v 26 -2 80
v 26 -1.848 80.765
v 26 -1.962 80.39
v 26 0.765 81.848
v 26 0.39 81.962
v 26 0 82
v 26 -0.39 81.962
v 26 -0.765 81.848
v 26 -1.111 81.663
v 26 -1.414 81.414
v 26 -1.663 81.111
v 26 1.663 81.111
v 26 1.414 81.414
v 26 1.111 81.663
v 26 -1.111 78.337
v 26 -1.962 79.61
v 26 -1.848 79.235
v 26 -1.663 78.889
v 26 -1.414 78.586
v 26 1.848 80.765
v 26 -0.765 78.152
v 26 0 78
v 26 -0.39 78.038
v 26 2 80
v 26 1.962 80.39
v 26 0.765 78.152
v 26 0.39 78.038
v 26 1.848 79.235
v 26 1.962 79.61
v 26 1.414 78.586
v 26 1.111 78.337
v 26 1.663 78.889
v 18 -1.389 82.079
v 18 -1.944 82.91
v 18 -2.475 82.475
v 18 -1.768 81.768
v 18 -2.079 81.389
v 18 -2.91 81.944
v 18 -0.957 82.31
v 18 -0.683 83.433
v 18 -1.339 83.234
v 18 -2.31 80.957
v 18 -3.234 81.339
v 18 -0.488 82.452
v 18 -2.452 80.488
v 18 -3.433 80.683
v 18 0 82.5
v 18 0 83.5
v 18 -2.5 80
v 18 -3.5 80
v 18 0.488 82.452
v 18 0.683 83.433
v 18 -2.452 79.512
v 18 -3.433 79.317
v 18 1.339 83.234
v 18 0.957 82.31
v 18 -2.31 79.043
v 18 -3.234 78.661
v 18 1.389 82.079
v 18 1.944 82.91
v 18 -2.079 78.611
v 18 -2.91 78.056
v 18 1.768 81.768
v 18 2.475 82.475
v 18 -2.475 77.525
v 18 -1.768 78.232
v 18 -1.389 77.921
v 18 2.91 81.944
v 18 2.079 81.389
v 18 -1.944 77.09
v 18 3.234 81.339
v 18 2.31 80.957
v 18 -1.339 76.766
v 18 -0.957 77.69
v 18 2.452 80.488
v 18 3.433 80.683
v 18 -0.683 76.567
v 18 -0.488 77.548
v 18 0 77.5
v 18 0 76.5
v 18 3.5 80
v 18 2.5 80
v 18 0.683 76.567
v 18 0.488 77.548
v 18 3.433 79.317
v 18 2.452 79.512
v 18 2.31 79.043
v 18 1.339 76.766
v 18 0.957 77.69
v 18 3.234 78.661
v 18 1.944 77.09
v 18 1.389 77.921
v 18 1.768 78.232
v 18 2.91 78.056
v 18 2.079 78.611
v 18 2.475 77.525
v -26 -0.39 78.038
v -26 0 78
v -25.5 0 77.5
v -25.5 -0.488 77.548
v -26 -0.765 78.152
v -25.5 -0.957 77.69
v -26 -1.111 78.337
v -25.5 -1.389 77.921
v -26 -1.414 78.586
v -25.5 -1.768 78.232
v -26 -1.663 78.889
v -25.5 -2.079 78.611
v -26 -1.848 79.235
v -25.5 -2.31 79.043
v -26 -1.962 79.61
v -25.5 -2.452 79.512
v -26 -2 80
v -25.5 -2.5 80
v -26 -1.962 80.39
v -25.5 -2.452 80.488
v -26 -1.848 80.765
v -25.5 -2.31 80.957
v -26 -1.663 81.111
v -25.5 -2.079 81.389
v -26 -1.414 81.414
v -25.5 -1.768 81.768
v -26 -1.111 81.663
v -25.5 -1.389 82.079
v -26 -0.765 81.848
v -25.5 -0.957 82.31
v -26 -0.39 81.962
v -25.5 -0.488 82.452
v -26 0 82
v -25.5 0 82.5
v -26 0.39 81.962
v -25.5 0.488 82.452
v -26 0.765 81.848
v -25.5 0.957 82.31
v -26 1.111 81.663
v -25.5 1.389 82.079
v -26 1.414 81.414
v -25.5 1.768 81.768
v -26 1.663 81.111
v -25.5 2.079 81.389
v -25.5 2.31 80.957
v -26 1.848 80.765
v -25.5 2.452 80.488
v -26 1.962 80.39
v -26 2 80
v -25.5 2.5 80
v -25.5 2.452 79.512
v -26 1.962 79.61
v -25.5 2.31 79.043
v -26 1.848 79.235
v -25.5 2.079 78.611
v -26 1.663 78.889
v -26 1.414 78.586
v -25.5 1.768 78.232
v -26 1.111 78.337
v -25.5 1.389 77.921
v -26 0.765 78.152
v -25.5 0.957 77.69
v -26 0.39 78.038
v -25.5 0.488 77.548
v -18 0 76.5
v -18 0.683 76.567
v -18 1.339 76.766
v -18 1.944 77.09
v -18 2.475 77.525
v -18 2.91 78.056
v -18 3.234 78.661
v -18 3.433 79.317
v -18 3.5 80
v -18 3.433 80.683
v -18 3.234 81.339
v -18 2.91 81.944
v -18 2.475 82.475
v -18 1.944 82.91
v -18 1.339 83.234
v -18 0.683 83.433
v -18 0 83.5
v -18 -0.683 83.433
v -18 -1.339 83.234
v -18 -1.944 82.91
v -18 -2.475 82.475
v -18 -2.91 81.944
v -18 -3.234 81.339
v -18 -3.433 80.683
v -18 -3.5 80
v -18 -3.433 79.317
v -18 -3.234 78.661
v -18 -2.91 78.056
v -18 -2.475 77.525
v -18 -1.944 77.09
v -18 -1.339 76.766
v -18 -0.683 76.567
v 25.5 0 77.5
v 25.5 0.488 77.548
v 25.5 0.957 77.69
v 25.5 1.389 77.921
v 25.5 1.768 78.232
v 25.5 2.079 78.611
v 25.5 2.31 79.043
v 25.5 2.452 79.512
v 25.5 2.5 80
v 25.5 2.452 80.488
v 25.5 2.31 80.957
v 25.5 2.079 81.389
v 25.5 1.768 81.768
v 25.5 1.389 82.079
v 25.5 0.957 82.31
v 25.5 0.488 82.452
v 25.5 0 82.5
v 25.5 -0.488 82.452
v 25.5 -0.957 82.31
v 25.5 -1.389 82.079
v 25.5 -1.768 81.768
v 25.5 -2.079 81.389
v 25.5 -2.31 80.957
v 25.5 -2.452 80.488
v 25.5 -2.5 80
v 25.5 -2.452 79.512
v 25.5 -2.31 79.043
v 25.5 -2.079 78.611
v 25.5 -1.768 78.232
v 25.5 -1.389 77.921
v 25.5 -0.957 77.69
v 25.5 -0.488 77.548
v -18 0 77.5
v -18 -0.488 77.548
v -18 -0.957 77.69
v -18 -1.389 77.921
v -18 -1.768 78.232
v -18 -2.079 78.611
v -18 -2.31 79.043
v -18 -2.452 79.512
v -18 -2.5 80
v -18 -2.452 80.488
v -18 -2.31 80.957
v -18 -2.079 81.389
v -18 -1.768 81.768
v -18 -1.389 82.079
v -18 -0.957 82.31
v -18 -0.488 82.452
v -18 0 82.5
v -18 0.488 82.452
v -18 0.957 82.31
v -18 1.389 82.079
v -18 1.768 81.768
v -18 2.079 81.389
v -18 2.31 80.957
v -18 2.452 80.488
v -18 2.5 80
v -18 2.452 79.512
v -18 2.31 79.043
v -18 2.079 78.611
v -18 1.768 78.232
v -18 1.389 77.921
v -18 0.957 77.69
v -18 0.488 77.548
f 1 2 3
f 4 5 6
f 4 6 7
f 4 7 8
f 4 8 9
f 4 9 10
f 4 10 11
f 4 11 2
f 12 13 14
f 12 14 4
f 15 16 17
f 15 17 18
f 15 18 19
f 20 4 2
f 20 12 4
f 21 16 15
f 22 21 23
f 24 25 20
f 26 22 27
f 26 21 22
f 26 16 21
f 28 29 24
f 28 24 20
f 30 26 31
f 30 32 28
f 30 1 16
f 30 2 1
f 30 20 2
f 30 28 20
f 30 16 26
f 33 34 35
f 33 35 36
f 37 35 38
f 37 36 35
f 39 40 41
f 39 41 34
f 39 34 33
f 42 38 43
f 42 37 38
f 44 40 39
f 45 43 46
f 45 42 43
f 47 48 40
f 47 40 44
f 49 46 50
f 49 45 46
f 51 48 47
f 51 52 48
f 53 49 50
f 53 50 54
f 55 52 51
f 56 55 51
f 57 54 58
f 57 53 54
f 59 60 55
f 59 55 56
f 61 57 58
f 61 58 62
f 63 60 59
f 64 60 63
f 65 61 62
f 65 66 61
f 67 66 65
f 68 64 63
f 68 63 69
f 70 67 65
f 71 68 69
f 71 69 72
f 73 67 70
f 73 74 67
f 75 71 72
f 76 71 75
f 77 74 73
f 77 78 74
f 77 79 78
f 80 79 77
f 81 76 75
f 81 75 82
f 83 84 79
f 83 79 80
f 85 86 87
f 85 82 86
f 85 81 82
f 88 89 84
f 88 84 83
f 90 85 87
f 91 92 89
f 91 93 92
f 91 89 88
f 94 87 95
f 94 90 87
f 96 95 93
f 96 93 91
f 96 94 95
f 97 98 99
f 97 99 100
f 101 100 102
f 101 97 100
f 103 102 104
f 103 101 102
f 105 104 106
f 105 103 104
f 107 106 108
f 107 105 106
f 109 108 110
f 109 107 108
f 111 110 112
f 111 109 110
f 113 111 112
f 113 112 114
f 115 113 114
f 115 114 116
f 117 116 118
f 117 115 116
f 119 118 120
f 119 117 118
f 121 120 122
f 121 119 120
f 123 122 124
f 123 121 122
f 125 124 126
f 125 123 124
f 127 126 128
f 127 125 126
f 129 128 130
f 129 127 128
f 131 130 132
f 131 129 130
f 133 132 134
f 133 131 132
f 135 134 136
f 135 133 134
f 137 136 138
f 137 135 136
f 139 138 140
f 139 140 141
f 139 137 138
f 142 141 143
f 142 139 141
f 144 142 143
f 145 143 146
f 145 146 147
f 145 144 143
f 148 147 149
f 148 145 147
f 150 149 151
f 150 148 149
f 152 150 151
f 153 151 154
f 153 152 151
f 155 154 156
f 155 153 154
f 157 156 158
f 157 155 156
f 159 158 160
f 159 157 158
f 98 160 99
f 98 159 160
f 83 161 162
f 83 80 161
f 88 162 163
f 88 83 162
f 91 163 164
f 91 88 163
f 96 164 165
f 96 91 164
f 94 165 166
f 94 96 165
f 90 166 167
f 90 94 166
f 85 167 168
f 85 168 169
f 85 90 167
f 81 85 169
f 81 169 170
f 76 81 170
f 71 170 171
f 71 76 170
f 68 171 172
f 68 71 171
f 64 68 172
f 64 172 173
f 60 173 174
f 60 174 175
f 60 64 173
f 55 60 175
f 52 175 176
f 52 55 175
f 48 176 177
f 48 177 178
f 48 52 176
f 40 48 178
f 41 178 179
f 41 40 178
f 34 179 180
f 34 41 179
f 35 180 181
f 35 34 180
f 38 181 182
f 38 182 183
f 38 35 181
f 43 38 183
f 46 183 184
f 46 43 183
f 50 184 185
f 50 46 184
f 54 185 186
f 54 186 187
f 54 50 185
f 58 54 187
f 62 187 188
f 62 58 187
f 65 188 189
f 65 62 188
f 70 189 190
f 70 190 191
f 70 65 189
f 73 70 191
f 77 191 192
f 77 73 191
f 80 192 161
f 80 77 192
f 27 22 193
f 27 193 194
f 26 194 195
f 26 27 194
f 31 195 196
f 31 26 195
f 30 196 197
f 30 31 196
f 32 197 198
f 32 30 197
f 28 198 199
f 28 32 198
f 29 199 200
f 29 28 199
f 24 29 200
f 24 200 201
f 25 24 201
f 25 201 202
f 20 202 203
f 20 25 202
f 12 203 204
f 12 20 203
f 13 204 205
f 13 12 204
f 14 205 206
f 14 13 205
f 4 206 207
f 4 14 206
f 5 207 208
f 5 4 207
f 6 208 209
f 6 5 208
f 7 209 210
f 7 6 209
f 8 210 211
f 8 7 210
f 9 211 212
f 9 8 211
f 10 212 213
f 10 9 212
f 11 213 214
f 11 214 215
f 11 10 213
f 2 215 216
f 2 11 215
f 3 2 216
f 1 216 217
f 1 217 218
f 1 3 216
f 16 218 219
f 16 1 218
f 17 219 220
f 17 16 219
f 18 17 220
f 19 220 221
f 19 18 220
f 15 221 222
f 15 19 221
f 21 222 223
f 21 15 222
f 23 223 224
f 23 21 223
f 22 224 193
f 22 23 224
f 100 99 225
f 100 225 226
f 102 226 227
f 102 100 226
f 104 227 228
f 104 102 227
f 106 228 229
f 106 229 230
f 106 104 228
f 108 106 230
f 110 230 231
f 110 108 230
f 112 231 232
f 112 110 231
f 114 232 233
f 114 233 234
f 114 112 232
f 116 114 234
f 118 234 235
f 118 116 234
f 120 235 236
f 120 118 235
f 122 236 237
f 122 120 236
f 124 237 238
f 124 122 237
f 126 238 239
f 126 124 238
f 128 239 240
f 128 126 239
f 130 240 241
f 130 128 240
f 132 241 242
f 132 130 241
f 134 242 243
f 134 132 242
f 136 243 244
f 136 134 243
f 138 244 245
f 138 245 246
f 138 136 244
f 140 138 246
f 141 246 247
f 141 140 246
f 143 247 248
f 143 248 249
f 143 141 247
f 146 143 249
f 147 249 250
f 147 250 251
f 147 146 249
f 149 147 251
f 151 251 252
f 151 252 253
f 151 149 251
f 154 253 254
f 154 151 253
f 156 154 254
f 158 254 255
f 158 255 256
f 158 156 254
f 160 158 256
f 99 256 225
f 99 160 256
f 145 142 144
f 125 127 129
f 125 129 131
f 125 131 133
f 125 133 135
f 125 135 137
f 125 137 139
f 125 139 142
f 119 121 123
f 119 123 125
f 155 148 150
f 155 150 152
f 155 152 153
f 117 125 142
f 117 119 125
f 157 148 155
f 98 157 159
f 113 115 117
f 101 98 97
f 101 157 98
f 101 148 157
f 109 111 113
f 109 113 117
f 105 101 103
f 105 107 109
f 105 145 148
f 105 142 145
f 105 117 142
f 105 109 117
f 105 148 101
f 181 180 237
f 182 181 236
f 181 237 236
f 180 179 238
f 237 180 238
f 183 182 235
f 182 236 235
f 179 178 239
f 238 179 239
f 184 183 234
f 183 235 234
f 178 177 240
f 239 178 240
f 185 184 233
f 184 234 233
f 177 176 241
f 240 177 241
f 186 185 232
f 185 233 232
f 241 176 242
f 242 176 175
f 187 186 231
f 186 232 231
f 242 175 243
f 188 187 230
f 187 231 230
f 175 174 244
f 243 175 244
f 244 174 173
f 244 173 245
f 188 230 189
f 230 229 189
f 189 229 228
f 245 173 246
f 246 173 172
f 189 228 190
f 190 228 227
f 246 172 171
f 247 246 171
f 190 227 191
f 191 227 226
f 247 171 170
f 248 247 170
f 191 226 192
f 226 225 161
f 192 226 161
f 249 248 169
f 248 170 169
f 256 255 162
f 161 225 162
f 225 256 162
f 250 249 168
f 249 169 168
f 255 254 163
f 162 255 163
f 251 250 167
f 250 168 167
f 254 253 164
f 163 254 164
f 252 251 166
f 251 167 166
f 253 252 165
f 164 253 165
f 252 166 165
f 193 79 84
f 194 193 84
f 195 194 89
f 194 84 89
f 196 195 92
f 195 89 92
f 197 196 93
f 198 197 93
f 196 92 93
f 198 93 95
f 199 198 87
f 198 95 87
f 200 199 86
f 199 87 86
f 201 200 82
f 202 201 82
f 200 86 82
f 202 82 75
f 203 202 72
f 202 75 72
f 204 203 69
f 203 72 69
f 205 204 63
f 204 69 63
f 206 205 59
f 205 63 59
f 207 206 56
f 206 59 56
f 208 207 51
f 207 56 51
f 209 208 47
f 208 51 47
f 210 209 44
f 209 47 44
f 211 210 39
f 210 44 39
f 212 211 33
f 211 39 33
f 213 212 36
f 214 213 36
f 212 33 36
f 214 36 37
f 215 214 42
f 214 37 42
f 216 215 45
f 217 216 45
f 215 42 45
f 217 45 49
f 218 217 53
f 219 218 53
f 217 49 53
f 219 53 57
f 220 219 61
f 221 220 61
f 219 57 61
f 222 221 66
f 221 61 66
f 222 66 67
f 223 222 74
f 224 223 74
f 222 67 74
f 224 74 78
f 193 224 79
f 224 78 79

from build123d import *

# Parameters (mm, degrees)
SCHIZZO1_R                   = 3.5
ESTRUSIONE_ESTRUSIONE1_DEPTH = 18
SCHIZZO2_R                   = 2.5
ESTRUSIONE_ESTRUSIONE2_DEPTH = 8
ESTRUSIONE_ESTRUSIONE3_START = 8
SCHIZZO3_R                   = 2.5
ESTRUSIONE_ESTRUSIONE3_DEPTH = 8
SMUSSO1_SIZE                 = 0.5


with BuildPart() as part:
    # Schizzo1 → Estrusione-Estrusione1 (new, symmetric)
    with BuildSketch(Plane(origin=(0, 0, 0), x_dir=(0, 0, -1), z_dir=(1, 0, 0))):
        with Locations((-80, 0)):
            Circle(SCHIZZO1_R)
    extrude(amount=ESTRUSIONE_ESTRUSIONE1_DEPTH, both=True)

    # Schizzo2 → Estrusione-Estrusione2 (add)
    with BuildSketch(Plane(origin=(18, 0, 0), x_dir=(0, 0, -1), z_dir=(1, 0, 0))):
        with Locations((-80, 0)):
            Circle(SCHIZZO2_R)
    extrude(amount=ESTRUSIONE_ESTRUSIONE2_DEPTH)

    # Schizzo3 → Estrusione-Estrusione3 (add)
    with BuildSketch(Plane.ZY.offset(18).offset(ESTRUSIONE_ESTRUSIONE3_START)):
        with Locations(Location((80, 0, 0), (0, 0, 180))):
            Circle(SCHIZZO3_R)
    extrude(amount=-ESTRUSIONE_ESTRUSIONE3_DEPTH)

    # Smusso1
    smusso1_edges = [part.edges().sort_by_distance(p)[0] for p in [
        (-26, 0, 82.5),
        (26, 0, 82.5),
    ]]
    chamfer(smusso1_edges, length=SMUSSO1_SIZE)


solid = part.part
